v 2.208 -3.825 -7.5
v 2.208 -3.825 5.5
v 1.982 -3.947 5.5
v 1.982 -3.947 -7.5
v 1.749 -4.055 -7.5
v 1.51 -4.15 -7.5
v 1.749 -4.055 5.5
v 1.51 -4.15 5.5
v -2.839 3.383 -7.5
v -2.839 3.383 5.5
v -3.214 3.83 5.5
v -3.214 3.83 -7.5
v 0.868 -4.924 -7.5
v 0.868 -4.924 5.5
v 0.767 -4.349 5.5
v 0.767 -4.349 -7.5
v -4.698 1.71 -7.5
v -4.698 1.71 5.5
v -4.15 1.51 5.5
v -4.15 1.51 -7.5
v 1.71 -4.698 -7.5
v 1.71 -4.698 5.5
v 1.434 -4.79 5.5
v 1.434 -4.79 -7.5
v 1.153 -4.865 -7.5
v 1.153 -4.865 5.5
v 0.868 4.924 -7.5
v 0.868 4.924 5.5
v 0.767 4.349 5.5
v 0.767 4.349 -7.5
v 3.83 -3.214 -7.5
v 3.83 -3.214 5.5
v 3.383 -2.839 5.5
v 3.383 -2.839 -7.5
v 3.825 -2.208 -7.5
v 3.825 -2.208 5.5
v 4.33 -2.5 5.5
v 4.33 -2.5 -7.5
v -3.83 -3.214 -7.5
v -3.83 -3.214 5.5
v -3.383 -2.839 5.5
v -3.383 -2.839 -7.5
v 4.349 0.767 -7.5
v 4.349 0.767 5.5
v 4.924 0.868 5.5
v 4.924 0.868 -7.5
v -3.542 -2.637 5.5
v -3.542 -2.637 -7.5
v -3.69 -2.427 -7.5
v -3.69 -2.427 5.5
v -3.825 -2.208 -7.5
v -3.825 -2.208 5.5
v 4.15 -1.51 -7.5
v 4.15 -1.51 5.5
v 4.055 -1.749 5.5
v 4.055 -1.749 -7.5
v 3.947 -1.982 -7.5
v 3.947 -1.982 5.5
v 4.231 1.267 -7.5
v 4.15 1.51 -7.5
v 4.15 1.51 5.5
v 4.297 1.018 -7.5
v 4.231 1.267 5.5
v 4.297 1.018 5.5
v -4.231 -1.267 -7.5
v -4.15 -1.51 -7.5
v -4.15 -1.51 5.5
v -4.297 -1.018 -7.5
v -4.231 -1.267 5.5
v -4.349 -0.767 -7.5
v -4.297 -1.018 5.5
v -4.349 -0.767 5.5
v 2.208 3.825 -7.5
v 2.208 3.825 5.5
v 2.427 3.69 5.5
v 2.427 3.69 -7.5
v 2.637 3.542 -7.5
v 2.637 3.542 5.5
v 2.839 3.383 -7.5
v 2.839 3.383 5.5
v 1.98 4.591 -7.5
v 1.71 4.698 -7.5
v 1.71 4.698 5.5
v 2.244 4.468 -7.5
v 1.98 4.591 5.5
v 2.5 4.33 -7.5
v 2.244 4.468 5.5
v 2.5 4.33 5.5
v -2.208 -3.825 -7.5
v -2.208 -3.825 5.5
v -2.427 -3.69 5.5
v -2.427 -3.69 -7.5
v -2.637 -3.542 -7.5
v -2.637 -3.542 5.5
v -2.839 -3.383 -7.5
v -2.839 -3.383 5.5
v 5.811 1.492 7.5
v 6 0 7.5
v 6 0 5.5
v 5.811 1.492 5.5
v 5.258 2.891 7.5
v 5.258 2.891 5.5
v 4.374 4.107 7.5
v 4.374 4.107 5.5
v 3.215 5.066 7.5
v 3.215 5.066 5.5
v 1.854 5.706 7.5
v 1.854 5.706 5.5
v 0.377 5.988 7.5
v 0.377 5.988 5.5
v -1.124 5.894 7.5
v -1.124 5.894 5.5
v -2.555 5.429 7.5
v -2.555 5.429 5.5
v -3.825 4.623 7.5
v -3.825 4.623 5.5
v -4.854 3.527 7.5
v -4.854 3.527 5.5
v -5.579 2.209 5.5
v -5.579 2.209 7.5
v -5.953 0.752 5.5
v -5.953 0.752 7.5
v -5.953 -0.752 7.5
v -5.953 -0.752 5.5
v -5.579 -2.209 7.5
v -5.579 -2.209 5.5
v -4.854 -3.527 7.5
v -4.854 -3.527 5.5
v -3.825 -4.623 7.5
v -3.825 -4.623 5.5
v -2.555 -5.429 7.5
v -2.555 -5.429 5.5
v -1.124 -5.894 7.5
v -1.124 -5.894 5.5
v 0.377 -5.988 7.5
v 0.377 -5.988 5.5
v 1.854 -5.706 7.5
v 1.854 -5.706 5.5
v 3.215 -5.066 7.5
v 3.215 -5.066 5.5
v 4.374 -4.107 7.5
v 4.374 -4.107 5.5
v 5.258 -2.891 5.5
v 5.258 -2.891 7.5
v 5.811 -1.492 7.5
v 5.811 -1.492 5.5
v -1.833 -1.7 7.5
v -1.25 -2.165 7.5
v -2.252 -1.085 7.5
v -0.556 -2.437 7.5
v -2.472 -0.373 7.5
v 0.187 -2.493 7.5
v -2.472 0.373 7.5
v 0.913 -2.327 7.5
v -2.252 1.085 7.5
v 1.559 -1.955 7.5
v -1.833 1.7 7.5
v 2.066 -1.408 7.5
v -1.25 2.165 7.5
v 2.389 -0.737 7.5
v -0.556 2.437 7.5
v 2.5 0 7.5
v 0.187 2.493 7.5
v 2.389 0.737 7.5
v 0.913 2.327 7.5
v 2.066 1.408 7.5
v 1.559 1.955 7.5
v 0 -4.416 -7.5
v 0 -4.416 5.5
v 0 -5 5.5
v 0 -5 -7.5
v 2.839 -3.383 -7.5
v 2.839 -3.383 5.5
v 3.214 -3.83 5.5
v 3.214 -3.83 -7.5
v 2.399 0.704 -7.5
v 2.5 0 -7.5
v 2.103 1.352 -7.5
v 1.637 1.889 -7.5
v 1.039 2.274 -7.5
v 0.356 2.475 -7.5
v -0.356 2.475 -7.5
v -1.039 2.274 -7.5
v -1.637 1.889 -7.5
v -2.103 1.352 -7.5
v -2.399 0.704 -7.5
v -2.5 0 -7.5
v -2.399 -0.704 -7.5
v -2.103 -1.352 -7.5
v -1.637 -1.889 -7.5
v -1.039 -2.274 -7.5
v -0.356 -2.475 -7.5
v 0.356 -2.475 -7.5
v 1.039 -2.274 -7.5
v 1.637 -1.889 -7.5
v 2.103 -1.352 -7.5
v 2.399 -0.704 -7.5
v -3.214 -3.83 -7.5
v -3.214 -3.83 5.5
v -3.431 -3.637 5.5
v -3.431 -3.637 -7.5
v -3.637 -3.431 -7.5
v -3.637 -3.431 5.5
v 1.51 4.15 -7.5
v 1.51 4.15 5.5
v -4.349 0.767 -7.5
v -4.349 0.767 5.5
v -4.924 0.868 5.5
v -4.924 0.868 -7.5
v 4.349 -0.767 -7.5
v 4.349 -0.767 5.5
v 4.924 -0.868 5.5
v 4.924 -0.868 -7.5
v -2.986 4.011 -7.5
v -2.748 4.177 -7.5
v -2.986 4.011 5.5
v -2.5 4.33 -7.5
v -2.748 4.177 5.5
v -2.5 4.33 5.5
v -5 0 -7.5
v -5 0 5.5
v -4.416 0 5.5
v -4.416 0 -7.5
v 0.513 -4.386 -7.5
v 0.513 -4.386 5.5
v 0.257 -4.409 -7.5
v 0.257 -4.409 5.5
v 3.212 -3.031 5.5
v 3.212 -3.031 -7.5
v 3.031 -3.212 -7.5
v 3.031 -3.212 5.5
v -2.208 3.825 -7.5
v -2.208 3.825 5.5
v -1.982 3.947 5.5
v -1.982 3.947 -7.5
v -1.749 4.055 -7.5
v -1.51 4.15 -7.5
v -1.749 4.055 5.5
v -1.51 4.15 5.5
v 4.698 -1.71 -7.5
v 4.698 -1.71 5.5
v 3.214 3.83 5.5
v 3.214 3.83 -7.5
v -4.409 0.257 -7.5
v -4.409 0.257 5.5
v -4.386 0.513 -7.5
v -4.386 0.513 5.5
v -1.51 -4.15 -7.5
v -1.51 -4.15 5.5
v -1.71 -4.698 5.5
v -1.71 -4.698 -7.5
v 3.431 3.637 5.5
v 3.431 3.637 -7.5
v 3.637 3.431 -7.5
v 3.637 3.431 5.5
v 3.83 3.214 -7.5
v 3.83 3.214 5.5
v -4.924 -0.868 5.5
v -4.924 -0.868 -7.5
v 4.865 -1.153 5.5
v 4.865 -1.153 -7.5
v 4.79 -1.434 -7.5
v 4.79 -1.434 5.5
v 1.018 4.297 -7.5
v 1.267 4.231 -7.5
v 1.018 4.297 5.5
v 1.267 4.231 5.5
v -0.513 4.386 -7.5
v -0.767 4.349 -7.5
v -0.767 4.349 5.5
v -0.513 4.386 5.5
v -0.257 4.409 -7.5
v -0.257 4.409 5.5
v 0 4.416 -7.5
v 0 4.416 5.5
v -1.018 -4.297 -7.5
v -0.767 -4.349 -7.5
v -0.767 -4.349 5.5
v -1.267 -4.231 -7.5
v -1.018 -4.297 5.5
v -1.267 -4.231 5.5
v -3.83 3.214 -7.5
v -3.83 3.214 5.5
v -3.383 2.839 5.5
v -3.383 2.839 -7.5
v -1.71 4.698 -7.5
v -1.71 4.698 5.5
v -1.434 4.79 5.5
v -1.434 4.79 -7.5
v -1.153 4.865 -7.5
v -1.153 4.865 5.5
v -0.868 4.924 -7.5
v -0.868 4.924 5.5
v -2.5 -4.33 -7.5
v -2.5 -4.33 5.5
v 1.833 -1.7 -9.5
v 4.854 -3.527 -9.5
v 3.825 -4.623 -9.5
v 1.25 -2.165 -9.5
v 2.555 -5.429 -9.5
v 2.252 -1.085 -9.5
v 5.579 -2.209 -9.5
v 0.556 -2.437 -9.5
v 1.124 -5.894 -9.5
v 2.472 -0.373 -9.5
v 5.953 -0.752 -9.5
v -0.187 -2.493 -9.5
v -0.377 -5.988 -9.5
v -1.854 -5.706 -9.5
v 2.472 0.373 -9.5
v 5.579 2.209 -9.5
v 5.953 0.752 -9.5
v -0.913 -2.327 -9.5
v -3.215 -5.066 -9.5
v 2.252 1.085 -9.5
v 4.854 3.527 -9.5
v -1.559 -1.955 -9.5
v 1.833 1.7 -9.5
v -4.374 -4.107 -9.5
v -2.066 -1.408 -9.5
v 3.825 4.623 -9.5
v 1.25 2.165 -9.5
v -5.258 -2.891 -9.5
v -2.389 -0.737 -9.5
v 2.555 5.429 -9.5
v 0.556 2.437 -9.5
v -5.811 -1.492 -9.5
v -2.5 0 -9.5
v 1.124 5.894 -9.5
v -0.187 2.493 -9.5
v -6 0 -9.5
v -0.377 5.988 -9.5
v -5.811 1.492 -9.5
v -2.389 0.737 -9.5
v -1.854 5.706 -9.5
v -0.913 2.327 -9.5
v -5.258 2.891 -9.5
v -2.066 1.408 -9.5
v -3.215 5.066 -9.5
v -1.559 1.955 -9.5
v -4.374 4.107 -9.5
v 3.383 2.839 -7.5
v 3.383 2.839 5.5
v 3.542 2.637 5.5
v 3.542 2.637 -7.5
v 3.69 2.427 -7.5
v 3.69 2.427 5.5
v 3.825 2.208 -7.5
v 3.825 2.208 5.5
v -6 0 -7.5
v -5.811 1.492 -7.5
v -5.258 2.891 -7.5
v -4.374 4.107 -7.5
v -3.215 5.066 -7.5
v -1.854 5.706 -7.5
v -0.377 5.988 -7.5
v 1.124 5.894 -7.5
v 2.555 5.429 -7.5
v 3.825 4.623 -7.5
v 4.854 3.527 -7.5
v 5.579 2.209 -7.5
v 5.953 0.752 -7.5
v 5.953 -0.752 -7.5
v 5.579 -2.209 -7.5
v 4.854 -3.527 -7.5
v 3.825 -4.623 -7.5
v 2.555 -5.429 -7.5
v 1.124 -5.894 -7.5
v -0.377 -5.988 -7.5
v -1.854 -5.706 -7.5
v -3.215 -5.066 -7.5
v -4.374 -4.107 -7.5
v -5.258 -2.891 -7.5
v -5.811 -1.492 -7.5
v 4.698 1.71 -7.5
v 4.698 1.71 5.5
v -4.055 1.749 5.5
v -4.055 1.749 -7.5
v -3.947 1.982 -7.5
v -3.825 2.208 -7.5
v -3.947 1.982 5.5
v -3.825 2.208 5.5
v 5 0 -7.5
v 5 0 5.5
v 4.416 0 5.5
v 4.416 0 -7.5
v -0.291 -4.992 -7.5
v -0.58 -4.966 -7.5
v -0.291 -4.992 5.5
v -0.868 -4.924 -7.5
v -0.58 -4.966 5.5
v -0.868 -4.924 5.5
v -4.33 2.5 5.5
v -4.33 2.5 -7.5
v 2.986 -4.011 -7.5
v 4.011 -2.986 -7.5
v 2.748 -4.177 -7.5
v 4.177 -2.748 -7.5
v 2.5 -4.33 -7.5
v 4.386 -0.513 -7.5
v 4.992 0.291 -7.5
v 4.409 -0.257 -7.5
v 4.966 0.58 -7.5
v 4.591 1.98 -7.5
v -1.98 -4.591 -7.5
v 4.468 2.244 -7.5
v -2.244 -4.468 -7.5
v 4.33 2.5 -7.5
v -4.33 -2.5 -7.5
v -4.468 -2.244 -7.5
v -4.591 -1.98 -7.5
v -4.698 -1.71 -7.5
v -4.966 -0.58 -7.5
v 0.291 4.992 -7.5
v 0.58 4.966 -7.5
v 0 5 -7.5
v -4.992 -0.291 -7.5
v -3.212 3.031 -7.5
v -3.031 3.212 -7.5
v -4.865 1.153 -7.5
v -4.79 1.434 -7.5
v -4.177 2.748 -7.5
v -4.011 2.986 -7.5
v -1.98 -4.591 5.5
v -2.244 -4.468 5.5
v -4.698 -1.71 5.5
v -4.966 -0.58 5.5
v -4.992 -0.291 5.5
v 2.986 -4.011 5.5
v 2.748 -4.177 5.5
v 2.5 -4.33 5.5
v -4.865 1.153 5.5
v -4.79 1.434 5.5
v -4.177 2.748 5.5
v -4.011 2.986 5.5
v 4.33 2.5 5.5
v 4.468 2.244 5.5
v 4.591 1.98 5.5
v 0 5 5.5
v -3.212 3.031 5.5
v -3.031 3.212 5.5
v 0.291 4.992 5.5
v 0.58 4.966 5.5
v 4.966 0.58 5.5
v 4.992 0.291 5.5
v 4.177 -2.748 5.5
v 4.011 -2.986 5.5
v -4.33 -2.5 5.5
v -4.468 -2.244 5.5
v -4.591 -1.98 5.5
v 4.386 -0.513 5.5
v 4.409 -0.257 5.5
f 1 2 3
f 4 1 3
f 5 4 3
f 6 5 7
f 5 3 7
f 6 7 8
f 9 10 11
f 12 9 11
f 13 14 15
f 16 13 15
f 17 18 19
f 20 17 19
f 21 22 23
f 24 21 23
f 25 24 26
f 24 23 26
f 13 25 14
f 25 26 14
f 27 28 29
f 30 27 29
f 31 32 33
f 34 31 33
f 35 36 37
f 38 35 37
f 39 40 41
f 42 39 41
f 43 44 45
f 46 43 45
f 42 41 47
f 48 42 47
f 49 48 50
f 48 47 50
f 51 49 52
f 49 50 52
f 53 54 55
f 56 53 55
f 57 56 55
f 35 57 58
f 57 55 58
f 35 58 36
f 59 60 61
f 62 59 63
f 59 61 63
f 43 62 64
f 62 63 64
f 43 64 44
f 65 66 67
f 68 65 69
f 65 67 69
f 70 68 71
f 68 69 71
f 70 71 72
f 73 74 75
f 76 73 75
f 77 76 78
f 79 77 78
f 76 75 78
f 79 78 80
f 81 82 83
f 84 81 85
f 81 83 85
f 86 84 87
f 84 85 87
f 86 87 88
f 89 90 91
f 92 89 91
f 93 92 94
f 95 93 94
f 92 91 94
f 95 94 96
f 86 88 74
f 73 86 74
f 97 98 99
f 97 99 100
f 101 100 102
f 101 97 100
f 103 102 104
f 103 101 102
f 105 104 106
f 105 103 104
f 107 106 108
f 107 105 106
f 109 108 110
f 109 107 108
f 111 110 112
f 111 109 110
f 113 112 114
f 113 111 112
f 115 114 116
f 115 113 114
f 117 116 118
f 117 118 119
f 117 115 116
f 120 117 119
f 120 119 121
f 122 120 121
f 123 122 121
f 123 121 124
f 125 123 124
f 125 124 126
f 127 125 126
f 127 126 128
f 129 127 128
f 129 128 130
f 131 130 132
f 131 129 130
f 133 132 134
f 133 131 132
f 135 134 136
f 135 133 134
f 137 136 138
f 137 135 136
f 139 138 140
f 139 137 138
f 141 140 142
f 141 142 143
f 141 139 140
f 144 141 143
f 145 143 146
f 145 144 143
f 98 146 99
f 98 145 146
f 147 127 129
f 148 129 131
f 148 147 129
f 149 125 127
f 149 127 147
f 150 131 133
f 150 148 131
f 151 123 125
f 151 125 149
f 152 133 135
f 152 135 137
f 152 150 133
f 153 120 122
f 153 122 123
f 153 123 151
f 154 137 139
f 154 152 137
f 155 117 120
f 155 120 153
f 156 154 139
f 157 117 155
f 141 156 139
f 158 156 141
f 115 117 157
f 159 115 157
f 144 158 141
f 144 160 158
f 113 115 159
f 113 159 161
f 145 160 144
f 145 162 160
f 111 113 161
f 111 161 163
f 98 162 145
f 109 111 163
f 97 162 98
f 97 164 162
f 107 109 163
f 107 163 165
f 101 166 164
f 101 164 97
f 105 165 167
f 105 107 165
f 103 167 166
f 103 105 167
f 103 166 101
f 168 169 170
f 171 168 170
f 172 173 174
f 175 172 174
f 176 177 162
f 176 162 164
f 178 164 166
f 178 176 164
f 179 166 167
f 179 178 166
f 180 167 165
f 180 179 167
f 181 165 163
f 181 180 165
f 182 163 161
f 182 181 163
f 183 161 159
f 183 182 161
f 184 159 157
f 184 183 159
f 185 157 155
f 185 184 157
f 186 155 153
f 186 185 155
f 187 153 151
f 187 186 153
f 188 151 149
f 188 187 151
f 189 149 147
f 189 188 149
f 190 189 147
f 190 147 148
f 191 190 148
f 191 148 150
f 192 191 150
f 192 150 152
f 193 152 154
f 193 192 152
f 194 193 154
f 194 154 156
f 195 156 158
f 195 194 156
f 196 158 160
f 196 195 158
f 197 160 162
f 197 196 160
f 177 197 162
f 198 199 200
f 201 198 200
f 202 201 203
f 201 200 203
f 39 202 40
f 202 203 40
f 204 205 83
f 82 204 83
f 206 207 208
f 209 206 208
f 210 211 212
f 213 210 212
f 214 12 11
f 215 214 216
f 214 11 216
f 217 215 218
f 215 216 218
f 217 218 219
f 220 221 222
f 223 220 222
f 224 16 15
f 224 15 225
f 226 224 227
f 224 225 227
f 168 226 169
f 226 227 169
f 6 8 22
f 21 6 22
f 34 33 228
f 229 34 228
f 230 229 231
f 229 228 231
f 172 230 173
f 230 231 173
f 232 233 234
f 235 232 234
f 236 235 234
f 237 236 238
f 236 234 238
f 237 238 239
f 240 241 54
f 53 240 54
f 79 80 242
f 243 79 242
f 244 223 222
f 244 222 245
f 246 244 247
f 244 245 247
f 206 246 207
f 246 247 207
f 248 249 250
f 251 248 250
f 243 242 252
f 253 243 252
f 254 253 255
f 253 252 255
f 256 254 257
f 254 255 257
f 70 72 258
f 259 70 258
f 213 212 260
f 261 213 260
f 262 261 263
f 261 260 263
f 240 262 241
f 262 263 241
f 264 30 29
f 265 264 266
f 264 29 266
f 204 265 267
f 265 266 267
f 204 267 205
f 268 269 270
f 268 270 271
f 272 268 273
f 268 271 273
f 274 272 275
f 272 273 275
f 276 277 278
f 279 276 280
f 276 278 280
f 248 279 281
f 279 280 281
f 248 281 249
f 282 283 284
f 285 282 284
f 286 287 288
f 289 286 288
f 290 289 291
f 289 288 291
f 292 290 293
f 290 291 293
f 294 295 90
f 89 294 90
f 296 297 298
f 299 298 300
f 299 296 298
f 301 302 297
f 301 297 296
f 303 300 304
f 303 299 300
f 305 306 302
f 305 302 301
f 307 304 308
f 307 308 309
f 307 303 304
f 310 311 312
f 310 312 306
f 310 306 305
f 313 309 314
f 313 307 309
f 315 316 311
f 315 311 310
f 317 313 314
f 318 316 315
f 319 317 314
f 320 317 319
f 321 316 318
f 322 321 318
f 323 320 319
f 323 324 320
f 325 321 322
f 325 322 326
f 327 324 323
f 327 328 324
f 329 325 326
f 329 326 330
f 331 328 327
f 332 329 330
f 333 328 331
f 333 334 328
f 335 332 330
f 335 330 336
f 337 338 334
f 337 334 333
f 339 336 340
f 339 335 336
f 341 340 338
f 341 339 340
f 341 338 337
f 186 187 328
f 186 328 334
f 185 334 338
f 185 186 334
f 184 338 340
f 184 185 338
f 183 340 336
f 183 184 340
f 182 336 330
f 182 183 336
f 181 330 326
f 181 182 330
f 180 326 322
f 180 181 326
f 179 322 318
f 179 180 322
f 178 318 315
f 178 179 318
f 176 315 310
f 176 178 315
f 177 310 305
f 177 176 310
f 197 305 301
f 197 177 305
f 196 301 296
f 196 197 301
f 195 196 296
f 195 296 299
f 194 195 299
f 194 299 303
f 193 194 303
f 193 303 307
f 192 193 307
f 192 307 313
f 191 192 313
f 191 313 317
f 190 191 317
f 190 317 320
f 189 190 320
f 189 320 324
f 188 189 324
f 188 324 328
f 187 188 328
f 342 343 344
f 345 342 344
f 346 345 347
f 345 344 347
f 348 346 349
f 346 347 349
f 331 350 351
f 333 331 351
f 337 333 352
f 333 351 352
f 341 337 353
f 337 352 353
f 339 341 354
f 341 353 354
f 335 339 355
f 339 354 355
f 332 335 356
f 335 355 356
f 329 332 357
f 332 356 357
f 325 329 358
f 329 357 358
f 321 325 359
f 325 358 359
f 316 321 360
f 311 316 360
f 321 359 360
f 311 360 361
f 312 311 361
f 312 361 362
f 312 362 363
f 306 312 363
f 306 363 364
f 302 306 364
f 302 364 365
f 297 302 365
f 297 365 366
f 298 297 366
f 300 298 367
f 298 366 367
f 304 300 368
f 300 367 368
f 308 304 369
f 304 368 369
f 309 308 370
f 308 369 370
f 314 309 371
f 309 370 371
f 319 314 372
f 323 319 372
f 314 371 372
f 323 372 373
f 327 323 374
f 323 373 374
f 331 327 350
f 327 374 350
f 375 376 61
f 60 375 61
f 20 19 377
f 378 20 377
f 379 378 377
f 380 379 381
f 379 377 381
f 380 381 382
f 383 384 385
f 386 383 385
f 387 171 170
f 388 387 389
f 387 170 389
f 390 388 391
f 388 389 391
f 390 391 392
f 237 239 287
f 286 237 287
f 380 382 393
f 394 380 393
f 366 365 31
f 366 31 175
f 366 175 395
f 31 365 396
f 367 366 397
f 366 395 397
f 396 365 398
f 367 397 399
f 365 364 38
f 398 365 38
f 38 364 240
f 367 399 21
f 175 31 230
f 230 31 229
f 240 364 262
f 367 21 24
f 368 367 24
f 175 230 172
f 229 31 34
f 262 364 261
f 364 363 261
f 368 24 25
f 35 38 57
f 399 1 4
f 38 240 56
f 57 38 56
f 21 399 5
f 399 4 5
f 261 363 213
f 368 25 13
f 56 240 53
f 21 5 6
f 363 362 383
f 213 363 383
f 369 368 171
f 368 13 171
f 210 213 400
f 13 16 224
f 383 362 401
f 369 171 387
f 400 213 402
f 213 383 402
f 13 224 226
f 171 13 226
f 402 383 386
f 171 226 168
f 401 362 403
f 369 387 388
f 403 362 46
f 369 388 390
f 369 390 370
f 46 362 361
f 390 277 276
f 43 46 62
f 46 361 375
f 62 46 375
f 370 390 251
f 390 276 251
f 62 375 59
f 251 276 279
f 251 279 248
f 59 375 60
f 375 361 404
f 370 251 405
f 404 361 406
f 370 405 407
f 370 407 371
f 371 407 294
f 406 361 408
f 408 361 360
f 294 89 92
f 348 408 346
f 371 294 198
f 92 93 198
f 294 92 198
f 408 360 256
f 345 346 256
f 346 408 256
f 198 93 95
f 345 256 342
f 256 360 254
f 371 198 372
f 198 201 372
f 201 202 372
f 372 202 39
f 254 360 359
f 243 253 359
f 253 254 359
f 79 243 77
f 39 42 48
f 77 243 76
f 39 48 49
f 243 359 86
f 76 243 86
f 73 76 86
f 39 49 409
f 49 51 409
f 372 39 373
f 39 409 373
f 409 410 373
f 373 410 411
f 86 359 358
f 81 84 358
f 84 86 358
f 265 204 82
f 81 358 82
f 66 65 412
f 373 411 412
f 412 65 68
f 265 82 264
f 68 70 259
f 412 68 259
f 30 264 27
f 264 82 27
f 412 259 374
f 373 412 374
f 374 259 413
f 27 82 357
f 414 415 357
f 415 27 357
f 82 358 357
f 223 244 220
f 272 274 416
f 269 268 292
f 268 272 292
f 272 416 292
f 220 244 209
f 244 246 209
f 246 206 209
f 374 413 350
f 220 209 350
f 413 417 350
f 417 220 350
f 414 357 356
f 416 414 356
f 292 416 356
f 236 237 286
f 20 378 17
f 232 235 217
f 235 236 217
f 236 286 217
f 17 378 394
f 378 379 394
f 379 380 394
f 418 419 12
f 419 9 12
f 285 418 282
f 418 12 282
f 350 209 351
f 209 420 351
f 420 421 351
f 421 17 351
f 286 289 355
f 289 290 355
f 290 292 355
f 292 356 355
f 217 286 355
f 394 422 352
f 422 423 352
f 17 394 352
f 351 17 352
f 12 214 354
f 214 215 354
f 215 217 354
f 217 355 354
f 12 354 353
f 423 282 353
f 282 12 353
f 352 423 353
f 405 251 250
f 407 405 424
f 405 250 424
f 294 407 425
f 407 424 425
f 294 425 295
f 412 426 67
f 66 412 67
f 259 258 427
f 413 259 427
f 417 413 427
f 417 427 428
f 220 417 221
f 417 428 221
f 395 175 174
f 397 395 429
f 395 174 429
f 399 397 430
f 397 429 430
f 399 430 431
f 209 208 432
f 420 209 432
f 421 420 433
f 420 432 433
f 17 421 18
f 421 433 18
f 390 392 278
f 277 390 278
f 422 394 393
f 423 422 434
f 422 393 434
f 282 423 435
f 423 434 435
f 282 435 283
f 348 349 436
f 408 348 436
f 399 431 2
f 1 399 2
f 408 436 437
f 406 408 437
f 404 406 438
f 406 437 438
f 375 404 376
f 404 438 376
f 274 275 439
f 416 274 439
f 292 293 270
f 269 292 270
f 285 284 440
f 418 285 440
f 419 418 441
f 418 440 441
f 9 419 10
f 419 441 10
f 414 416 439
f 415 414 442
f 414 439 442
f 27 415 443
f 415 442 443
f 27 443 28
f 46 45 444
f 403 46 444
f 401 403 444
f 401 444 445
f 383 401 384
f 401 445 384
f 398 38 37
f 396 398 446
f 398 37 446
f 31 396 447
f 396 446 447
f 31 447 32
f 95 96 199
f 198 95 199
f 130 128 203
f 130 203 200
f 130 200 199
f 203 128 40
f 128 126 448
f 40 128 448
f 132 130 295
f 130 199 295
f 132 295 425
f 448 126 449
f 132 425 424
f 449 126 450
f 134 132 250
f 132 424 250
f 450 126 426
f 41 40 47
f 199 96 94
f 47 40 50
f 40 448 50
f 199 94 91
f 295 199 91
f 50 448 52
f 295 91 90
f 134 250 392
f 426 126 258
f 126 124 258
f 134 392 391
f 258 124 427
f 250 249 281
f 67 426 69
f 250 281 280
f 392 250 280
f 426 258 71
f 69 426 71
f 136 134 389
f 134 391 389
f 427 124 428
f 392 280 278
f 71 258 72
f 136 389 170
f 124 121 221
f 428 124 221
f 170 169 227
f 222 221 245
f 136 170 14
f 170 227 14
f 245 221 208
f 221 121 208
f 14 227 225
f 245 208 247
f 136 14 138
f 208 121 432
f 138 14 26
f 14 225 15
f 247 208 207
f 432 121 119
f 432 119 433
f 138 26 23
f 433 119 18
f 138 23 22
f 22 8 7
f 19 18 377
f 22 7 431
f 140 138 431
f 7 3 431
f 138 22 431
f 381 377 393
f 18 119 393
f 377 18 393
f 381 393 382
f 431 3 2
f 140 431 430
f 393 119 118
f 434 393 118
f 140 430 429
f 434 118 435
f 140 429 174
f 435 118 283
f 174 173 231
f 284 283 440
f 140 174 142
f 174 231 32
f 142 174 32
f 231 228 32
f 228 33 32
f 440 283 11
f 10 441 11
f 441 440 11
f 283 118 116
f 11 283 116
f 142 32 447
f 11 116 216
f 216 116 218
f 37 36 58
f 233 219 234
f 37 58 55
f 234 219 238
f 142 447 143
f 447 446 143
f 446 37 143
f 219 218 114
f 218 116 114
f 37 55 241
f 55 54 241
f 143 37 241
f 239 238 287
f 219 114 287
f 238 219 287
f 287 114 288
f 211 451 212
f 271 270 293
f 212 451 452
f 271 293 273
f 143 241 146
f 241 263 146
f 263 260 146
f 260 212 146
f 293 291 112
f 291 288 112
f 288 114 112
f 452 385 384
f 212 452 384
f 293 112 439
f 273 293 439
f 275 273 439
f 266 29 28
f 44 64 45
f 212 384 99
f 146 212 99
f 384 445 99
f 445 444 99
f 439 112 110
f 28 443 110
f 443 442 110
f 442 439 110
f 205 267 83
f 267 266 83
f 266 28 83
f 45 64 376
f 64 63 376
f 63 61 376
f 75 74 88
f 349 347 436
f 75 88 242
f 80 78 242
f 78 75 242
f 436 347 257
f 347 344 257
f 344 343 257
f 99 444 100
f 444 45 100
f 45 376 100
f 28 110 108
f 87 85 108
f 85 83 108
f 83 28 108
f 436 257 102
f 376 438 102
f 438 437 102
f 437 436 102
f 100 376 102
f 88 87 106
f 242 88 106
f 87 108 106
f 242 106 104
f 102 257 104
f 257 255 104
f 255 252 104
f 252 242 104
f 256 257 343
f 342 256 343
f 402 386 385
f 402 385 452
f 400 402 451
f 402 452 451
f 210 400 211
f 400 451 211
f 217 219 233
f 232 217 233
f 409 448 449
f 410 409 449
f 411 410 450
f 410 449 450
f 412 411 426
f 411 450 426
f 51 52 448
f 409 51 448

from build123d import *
from build123d.topology import SkipClean

# Parameters (mm, degrees)
SALIENTE_EXTRUIR1_DEPTH      = 7.5
SALIENTE_EXTRUIR1_DEPTH_BACK = 7.5
CROQUIS1_R                   = 2.5
SALIENTE_EXTRUIR2_START      = -2
CROQUIS2_R                   = 6
CROQUIS2_R_2                 = 2.5
SALIENTE_EXTRUIR2_DEPTH      = 2
SALIENTE_EXTRUIR3_START      = 2
CROQUIS3_R                   = 6
CROQUIS3_R_2                 = 2.5
SALIENTE_EXTRUIR3_DEPTH      = 2


with BuildPart() as part:
    # Croquis1 → Saliente-Extruir1 (new, two sides: drawn at the far end of the back side and taken through both)
    with BuildSketch(Plane.XY.offset(-SALIENTE_EXTRUIR1_DEPTH_BACK)):
        with BuildLine():
            Line((0, 4.41631546), (0, 5))
            ThreePointArc((0, 5), (0.435778714, 4.98097349), (0.868240888, 4.924038765))
            Line((0.868240888, 4.924038765), (0.766885132, 4.349221705))
            ThreePointArc((0.766885132, 4.349221705), (1.14302655, 4.26583316), (1.510468847, 4.149979049))
            Line((1.510468847, 4.149979049), (1.710100717, 4.698463104))
            ThreePointArc((1.710100717, 4.698463104), (2.113091309, 4.531538935), (2.5, 4.330127019))
            Line((2.5, 4.330127019), (2.20815773, 3.824641379))
            ThreePointArc((2.20815773, 3.824641379), (2.533094483, 3.617633837), (2.838752858, 3.383093917))
            Line((2.838752858, 3.383093917), (3.213938048, 3.830222216))
            ThreePointArc((3.213938048, 3.830222216), (3.535533906, 3.535533906), (3.830222216, 3.213938048))
            Line((3.830222216, 3.213938048), (3.383093917, 2.838752858))
            ThreePointArc((3.383093917, 2.838752858), (3.617633837, 2.533094483), (3.824641379, 2.20815773))
            Line((3.824641379, 2.20815773), (4.330127019, 2.5))
            ThreePointArc((4.330127019, 2.5), (4.531538935, 2.113091309), (4.698463104, 1.710100717))
            Line((4.698463104, 1.710100717), (4.149979049, 1.510468847))
            ThreePointArc((4.149979049, 1.510468847), (4.26583316, 1.14302655), (4.349221705, 0.766885132))
            Line((4.349221705, 0.766885132), (4.924038765, 0.868240888))
            ThreePointArc((4.924038765, 0.868240888), (4.98097349, 0.435778714), (5, 0))
            Line((5, 0), (4.41631546, 0))
            ThreePointArc((4.41631546, 0), (4.399510046, -0.384907254), (4.349221705, -0.766885132))
            Line((4.349221705, -0.766885132), (4.924038765, -0.868240888))
            ThreePointArc((4.924038765, -0.868240888), (4.829629131, -1.294095226), (4.698463104, -1.710100717))
            Line((4.698463104, -1.710100717), (4.149979049, -1.510468847))
            ThreePointArc((4.149979049, -1.510468847), (4.002541091, -1.866415563), (3.824641379, -2.20815773))
            Line((3.824641379, -2.20815773), (4.330127019, -2.5))
            ThreePointArc((4.330127019, -2.5), (4.095760221, -2.867882182), (3.830222216, -3.213938048))
            Line((3.830222216, -3.213938048), (3.383093917, -2.838752858))
            ThreePointArc((3.383093917, -2.838752858), (3.122806609, -3.122806609), (2.838752858, -3.383093917))
            Line((2.838752858, -3.383093917), (3.213938048, -3.830222216))
            ThreePointArc((3.213938048, -3.830222216), (2.867882182, -4.095760221), (2.5, -4.330127019))
            Line((2.5, -4.330127019), (2.20815773, -3.824641379))
            ThreePointArc((2.20815773, -3.824641379), (1.866415563, -4.002541091), (1.510468847, -4.149979049))
            Line((1.510468847, -4.149979049), (1.710100717, -4.698463104))
            ThreePointArc((1.710100717, -4.698463104), (1.294095226, -4.829629131), (0.868240888, -4.924038765))
            Line((0.868240888, -4.924038765), (0.766885132, -4.349221705))
            ThreePointArc((0.766885132, -4.349221705), (0.384907254, -4.399510046), (0, -4.41631546))
            Line((0, -4.41631546), (0, -5))
            ThreePointArc((0, -5), (-0.435778714, -4.98097349), (-0.868240888, -4.924038765))
            Line((-0.868240888, -4.924038765), (-0.766885132, -4.349221705))
            ThreePointArc((-0.766885132, -4.349221705), (-1.14302655, -4.26583316), (-1.510468847, -4.149979049))
            Line((-1.510468847, -4.149979049), (-1.710100717, -4.698463104))
            ThreePointArc((-1.710100717, -4.698463104), (-2.113091309, -4.531538935), (-2.5, -4.330127019))
            Line((-2.5, -4.330127019), (-2.20815773, -3.824641379))
            ThreePointArc((-2.20815773, -3.824641379), (-2.533094483, -3.617633837), (-2.838752858, -3.383093917))
            Line((-2.838752858, -3.383093917), (-3.213938048, -3.830222216))
            ThreePointArc((-3.213938048, -3.830222216), (-3.535533906, -3.535533906), (-3.830222216, -3.213938048))
            Line((-3.830222216, -3.213938048), (-3.383093917, -2.838752858))
            ThreePointArc((-3.383093917, -2.838752858), (-3.617633837, -2.533094483), (-3.824641379, -2.20815773))
            Line((-3.824641379, -2.20815773), (-4.330127019, -2.5))
            ThreePointArc((-4.330127019, -2.5), (-4.531538935, -2.113091309), (-4.698463104, -1.710100717))
            Line((-4.698463104, -1.710100717), (-4.149979049, -1.510468847))
            ThreePointArc((-4.149979049, -1.510468847), (-4.26583316, -1.14302655), (-4.349221705, -0.766885132))
            Line((-4.349221705, -0.766885132), (-4.924038765, -0.868240888))
            ThreePointArc((-4.924038765, -0.868240888), (-4.98097349, -0.435778714), (-5, 0))
            Line((-5, 0), (-4.41631546, 0))
            ThreePointArc((-4.41631546, 0), (-4.399510046, 0.384907254), (-4.349221705, 0.766885132))
            Line((-4.349221705, 0.766885132), (-4.924038765, 0.868240888))
            ThreePointArc((-4.924038765, 0.868240888), (-4.829629131, 1.294095226), (-4.698463104, 1.710100717))
            Line((-4.698463104, 1.710100717), (-4.149979049, 1.510468847))
            ThreePointArc((-4.149979049, 1.510468847), (-4.002541091, 1.866415563), (-3.824641379, 2.20815773))
            Line((-3.824641379, 2.20815773), (-4.330127019, 2.5))
            ThreePointArc((-4.330127019, 2.5), (-4.095760221, 2.867882182), (-3.830222216, 3.213938048))
            Line((-3.830222216, 3.213938048), (-3.383093917, 2.838752858))
            ThreePointArc((-3.383093917, 2.838752858), (-3.122806609, 3.122806609), (-2.838752858, 3.383093917))
            Line((-2.838752858, 3.383093917), (-3.213938048, 3.830222216))
            ThreePointArc((-3.213938048, 3.830222216), (-2.867882182, 4.095760221), (-2.5, 4.330127019))
            Line((-2.5, 4.330127019), (-2.20815773, 3.824641379))
            ThreePointArc((-2.20815773, 3.824641379), (-1.866415563, 4.002541091), (-1.510468847, 4.149979049))
            Line((-1.510468847, 4.149979049), (-1.710100717, 4.698463104))
            ThreePointArc((-1.710100717, 4.698463104), (-1.294095226, 4.829629131), (-0.868240888, 4.924038765))
            Line((-0.868240888, 4.924038765), (-0.766885132, 4.349221705))
            ThreePointArc((-0.766885132, 4.349221705), (-0.384907254, 4.399510046), (0, 4.41631546))
        make_face()
        Circle(CROQUIS1_R, mode=Mode.SUBTRACT)
    extrude(amount=SALIENTE_EXTRUIR1_DEPTH + SALIENTE_EXTRUIR1_DEPTH_BACK)

    # Croquis2 → Saliente-Extruir2 (add)
    with BuildSketch(Plane.XY.offset(7.5).offset(SALIENTE_EXTRUIR2_START)):
        Circle(CROQUIS2_R)
        Circle(CROQUIS2_R_2, mode=Mode.SUBTRACT)
    extrude(amount=SALIENTE_EXTRUIR2_DEPTH)

    # Croquis3 → Saliente-Extruir3 (add)
    with SkipClean():  # the faces are left unmerged after this step: merging them gives an invalid solid
        with BuildSketch(Plane(origin=(0, 0, -7.5), x_dir=(-1, 0, 0), z_dir=(0, 0, -1)).offset(SALIENTE_EXTRUIR3_START)):
            Circle(CROQUIS3_R)
            Circle(CROQUIS3_R_2, mode=Mode.SUBTRACT)
        extrude(amount=-SALIENTE_EXTRUIR3_DEPTH)


solid = part.part
